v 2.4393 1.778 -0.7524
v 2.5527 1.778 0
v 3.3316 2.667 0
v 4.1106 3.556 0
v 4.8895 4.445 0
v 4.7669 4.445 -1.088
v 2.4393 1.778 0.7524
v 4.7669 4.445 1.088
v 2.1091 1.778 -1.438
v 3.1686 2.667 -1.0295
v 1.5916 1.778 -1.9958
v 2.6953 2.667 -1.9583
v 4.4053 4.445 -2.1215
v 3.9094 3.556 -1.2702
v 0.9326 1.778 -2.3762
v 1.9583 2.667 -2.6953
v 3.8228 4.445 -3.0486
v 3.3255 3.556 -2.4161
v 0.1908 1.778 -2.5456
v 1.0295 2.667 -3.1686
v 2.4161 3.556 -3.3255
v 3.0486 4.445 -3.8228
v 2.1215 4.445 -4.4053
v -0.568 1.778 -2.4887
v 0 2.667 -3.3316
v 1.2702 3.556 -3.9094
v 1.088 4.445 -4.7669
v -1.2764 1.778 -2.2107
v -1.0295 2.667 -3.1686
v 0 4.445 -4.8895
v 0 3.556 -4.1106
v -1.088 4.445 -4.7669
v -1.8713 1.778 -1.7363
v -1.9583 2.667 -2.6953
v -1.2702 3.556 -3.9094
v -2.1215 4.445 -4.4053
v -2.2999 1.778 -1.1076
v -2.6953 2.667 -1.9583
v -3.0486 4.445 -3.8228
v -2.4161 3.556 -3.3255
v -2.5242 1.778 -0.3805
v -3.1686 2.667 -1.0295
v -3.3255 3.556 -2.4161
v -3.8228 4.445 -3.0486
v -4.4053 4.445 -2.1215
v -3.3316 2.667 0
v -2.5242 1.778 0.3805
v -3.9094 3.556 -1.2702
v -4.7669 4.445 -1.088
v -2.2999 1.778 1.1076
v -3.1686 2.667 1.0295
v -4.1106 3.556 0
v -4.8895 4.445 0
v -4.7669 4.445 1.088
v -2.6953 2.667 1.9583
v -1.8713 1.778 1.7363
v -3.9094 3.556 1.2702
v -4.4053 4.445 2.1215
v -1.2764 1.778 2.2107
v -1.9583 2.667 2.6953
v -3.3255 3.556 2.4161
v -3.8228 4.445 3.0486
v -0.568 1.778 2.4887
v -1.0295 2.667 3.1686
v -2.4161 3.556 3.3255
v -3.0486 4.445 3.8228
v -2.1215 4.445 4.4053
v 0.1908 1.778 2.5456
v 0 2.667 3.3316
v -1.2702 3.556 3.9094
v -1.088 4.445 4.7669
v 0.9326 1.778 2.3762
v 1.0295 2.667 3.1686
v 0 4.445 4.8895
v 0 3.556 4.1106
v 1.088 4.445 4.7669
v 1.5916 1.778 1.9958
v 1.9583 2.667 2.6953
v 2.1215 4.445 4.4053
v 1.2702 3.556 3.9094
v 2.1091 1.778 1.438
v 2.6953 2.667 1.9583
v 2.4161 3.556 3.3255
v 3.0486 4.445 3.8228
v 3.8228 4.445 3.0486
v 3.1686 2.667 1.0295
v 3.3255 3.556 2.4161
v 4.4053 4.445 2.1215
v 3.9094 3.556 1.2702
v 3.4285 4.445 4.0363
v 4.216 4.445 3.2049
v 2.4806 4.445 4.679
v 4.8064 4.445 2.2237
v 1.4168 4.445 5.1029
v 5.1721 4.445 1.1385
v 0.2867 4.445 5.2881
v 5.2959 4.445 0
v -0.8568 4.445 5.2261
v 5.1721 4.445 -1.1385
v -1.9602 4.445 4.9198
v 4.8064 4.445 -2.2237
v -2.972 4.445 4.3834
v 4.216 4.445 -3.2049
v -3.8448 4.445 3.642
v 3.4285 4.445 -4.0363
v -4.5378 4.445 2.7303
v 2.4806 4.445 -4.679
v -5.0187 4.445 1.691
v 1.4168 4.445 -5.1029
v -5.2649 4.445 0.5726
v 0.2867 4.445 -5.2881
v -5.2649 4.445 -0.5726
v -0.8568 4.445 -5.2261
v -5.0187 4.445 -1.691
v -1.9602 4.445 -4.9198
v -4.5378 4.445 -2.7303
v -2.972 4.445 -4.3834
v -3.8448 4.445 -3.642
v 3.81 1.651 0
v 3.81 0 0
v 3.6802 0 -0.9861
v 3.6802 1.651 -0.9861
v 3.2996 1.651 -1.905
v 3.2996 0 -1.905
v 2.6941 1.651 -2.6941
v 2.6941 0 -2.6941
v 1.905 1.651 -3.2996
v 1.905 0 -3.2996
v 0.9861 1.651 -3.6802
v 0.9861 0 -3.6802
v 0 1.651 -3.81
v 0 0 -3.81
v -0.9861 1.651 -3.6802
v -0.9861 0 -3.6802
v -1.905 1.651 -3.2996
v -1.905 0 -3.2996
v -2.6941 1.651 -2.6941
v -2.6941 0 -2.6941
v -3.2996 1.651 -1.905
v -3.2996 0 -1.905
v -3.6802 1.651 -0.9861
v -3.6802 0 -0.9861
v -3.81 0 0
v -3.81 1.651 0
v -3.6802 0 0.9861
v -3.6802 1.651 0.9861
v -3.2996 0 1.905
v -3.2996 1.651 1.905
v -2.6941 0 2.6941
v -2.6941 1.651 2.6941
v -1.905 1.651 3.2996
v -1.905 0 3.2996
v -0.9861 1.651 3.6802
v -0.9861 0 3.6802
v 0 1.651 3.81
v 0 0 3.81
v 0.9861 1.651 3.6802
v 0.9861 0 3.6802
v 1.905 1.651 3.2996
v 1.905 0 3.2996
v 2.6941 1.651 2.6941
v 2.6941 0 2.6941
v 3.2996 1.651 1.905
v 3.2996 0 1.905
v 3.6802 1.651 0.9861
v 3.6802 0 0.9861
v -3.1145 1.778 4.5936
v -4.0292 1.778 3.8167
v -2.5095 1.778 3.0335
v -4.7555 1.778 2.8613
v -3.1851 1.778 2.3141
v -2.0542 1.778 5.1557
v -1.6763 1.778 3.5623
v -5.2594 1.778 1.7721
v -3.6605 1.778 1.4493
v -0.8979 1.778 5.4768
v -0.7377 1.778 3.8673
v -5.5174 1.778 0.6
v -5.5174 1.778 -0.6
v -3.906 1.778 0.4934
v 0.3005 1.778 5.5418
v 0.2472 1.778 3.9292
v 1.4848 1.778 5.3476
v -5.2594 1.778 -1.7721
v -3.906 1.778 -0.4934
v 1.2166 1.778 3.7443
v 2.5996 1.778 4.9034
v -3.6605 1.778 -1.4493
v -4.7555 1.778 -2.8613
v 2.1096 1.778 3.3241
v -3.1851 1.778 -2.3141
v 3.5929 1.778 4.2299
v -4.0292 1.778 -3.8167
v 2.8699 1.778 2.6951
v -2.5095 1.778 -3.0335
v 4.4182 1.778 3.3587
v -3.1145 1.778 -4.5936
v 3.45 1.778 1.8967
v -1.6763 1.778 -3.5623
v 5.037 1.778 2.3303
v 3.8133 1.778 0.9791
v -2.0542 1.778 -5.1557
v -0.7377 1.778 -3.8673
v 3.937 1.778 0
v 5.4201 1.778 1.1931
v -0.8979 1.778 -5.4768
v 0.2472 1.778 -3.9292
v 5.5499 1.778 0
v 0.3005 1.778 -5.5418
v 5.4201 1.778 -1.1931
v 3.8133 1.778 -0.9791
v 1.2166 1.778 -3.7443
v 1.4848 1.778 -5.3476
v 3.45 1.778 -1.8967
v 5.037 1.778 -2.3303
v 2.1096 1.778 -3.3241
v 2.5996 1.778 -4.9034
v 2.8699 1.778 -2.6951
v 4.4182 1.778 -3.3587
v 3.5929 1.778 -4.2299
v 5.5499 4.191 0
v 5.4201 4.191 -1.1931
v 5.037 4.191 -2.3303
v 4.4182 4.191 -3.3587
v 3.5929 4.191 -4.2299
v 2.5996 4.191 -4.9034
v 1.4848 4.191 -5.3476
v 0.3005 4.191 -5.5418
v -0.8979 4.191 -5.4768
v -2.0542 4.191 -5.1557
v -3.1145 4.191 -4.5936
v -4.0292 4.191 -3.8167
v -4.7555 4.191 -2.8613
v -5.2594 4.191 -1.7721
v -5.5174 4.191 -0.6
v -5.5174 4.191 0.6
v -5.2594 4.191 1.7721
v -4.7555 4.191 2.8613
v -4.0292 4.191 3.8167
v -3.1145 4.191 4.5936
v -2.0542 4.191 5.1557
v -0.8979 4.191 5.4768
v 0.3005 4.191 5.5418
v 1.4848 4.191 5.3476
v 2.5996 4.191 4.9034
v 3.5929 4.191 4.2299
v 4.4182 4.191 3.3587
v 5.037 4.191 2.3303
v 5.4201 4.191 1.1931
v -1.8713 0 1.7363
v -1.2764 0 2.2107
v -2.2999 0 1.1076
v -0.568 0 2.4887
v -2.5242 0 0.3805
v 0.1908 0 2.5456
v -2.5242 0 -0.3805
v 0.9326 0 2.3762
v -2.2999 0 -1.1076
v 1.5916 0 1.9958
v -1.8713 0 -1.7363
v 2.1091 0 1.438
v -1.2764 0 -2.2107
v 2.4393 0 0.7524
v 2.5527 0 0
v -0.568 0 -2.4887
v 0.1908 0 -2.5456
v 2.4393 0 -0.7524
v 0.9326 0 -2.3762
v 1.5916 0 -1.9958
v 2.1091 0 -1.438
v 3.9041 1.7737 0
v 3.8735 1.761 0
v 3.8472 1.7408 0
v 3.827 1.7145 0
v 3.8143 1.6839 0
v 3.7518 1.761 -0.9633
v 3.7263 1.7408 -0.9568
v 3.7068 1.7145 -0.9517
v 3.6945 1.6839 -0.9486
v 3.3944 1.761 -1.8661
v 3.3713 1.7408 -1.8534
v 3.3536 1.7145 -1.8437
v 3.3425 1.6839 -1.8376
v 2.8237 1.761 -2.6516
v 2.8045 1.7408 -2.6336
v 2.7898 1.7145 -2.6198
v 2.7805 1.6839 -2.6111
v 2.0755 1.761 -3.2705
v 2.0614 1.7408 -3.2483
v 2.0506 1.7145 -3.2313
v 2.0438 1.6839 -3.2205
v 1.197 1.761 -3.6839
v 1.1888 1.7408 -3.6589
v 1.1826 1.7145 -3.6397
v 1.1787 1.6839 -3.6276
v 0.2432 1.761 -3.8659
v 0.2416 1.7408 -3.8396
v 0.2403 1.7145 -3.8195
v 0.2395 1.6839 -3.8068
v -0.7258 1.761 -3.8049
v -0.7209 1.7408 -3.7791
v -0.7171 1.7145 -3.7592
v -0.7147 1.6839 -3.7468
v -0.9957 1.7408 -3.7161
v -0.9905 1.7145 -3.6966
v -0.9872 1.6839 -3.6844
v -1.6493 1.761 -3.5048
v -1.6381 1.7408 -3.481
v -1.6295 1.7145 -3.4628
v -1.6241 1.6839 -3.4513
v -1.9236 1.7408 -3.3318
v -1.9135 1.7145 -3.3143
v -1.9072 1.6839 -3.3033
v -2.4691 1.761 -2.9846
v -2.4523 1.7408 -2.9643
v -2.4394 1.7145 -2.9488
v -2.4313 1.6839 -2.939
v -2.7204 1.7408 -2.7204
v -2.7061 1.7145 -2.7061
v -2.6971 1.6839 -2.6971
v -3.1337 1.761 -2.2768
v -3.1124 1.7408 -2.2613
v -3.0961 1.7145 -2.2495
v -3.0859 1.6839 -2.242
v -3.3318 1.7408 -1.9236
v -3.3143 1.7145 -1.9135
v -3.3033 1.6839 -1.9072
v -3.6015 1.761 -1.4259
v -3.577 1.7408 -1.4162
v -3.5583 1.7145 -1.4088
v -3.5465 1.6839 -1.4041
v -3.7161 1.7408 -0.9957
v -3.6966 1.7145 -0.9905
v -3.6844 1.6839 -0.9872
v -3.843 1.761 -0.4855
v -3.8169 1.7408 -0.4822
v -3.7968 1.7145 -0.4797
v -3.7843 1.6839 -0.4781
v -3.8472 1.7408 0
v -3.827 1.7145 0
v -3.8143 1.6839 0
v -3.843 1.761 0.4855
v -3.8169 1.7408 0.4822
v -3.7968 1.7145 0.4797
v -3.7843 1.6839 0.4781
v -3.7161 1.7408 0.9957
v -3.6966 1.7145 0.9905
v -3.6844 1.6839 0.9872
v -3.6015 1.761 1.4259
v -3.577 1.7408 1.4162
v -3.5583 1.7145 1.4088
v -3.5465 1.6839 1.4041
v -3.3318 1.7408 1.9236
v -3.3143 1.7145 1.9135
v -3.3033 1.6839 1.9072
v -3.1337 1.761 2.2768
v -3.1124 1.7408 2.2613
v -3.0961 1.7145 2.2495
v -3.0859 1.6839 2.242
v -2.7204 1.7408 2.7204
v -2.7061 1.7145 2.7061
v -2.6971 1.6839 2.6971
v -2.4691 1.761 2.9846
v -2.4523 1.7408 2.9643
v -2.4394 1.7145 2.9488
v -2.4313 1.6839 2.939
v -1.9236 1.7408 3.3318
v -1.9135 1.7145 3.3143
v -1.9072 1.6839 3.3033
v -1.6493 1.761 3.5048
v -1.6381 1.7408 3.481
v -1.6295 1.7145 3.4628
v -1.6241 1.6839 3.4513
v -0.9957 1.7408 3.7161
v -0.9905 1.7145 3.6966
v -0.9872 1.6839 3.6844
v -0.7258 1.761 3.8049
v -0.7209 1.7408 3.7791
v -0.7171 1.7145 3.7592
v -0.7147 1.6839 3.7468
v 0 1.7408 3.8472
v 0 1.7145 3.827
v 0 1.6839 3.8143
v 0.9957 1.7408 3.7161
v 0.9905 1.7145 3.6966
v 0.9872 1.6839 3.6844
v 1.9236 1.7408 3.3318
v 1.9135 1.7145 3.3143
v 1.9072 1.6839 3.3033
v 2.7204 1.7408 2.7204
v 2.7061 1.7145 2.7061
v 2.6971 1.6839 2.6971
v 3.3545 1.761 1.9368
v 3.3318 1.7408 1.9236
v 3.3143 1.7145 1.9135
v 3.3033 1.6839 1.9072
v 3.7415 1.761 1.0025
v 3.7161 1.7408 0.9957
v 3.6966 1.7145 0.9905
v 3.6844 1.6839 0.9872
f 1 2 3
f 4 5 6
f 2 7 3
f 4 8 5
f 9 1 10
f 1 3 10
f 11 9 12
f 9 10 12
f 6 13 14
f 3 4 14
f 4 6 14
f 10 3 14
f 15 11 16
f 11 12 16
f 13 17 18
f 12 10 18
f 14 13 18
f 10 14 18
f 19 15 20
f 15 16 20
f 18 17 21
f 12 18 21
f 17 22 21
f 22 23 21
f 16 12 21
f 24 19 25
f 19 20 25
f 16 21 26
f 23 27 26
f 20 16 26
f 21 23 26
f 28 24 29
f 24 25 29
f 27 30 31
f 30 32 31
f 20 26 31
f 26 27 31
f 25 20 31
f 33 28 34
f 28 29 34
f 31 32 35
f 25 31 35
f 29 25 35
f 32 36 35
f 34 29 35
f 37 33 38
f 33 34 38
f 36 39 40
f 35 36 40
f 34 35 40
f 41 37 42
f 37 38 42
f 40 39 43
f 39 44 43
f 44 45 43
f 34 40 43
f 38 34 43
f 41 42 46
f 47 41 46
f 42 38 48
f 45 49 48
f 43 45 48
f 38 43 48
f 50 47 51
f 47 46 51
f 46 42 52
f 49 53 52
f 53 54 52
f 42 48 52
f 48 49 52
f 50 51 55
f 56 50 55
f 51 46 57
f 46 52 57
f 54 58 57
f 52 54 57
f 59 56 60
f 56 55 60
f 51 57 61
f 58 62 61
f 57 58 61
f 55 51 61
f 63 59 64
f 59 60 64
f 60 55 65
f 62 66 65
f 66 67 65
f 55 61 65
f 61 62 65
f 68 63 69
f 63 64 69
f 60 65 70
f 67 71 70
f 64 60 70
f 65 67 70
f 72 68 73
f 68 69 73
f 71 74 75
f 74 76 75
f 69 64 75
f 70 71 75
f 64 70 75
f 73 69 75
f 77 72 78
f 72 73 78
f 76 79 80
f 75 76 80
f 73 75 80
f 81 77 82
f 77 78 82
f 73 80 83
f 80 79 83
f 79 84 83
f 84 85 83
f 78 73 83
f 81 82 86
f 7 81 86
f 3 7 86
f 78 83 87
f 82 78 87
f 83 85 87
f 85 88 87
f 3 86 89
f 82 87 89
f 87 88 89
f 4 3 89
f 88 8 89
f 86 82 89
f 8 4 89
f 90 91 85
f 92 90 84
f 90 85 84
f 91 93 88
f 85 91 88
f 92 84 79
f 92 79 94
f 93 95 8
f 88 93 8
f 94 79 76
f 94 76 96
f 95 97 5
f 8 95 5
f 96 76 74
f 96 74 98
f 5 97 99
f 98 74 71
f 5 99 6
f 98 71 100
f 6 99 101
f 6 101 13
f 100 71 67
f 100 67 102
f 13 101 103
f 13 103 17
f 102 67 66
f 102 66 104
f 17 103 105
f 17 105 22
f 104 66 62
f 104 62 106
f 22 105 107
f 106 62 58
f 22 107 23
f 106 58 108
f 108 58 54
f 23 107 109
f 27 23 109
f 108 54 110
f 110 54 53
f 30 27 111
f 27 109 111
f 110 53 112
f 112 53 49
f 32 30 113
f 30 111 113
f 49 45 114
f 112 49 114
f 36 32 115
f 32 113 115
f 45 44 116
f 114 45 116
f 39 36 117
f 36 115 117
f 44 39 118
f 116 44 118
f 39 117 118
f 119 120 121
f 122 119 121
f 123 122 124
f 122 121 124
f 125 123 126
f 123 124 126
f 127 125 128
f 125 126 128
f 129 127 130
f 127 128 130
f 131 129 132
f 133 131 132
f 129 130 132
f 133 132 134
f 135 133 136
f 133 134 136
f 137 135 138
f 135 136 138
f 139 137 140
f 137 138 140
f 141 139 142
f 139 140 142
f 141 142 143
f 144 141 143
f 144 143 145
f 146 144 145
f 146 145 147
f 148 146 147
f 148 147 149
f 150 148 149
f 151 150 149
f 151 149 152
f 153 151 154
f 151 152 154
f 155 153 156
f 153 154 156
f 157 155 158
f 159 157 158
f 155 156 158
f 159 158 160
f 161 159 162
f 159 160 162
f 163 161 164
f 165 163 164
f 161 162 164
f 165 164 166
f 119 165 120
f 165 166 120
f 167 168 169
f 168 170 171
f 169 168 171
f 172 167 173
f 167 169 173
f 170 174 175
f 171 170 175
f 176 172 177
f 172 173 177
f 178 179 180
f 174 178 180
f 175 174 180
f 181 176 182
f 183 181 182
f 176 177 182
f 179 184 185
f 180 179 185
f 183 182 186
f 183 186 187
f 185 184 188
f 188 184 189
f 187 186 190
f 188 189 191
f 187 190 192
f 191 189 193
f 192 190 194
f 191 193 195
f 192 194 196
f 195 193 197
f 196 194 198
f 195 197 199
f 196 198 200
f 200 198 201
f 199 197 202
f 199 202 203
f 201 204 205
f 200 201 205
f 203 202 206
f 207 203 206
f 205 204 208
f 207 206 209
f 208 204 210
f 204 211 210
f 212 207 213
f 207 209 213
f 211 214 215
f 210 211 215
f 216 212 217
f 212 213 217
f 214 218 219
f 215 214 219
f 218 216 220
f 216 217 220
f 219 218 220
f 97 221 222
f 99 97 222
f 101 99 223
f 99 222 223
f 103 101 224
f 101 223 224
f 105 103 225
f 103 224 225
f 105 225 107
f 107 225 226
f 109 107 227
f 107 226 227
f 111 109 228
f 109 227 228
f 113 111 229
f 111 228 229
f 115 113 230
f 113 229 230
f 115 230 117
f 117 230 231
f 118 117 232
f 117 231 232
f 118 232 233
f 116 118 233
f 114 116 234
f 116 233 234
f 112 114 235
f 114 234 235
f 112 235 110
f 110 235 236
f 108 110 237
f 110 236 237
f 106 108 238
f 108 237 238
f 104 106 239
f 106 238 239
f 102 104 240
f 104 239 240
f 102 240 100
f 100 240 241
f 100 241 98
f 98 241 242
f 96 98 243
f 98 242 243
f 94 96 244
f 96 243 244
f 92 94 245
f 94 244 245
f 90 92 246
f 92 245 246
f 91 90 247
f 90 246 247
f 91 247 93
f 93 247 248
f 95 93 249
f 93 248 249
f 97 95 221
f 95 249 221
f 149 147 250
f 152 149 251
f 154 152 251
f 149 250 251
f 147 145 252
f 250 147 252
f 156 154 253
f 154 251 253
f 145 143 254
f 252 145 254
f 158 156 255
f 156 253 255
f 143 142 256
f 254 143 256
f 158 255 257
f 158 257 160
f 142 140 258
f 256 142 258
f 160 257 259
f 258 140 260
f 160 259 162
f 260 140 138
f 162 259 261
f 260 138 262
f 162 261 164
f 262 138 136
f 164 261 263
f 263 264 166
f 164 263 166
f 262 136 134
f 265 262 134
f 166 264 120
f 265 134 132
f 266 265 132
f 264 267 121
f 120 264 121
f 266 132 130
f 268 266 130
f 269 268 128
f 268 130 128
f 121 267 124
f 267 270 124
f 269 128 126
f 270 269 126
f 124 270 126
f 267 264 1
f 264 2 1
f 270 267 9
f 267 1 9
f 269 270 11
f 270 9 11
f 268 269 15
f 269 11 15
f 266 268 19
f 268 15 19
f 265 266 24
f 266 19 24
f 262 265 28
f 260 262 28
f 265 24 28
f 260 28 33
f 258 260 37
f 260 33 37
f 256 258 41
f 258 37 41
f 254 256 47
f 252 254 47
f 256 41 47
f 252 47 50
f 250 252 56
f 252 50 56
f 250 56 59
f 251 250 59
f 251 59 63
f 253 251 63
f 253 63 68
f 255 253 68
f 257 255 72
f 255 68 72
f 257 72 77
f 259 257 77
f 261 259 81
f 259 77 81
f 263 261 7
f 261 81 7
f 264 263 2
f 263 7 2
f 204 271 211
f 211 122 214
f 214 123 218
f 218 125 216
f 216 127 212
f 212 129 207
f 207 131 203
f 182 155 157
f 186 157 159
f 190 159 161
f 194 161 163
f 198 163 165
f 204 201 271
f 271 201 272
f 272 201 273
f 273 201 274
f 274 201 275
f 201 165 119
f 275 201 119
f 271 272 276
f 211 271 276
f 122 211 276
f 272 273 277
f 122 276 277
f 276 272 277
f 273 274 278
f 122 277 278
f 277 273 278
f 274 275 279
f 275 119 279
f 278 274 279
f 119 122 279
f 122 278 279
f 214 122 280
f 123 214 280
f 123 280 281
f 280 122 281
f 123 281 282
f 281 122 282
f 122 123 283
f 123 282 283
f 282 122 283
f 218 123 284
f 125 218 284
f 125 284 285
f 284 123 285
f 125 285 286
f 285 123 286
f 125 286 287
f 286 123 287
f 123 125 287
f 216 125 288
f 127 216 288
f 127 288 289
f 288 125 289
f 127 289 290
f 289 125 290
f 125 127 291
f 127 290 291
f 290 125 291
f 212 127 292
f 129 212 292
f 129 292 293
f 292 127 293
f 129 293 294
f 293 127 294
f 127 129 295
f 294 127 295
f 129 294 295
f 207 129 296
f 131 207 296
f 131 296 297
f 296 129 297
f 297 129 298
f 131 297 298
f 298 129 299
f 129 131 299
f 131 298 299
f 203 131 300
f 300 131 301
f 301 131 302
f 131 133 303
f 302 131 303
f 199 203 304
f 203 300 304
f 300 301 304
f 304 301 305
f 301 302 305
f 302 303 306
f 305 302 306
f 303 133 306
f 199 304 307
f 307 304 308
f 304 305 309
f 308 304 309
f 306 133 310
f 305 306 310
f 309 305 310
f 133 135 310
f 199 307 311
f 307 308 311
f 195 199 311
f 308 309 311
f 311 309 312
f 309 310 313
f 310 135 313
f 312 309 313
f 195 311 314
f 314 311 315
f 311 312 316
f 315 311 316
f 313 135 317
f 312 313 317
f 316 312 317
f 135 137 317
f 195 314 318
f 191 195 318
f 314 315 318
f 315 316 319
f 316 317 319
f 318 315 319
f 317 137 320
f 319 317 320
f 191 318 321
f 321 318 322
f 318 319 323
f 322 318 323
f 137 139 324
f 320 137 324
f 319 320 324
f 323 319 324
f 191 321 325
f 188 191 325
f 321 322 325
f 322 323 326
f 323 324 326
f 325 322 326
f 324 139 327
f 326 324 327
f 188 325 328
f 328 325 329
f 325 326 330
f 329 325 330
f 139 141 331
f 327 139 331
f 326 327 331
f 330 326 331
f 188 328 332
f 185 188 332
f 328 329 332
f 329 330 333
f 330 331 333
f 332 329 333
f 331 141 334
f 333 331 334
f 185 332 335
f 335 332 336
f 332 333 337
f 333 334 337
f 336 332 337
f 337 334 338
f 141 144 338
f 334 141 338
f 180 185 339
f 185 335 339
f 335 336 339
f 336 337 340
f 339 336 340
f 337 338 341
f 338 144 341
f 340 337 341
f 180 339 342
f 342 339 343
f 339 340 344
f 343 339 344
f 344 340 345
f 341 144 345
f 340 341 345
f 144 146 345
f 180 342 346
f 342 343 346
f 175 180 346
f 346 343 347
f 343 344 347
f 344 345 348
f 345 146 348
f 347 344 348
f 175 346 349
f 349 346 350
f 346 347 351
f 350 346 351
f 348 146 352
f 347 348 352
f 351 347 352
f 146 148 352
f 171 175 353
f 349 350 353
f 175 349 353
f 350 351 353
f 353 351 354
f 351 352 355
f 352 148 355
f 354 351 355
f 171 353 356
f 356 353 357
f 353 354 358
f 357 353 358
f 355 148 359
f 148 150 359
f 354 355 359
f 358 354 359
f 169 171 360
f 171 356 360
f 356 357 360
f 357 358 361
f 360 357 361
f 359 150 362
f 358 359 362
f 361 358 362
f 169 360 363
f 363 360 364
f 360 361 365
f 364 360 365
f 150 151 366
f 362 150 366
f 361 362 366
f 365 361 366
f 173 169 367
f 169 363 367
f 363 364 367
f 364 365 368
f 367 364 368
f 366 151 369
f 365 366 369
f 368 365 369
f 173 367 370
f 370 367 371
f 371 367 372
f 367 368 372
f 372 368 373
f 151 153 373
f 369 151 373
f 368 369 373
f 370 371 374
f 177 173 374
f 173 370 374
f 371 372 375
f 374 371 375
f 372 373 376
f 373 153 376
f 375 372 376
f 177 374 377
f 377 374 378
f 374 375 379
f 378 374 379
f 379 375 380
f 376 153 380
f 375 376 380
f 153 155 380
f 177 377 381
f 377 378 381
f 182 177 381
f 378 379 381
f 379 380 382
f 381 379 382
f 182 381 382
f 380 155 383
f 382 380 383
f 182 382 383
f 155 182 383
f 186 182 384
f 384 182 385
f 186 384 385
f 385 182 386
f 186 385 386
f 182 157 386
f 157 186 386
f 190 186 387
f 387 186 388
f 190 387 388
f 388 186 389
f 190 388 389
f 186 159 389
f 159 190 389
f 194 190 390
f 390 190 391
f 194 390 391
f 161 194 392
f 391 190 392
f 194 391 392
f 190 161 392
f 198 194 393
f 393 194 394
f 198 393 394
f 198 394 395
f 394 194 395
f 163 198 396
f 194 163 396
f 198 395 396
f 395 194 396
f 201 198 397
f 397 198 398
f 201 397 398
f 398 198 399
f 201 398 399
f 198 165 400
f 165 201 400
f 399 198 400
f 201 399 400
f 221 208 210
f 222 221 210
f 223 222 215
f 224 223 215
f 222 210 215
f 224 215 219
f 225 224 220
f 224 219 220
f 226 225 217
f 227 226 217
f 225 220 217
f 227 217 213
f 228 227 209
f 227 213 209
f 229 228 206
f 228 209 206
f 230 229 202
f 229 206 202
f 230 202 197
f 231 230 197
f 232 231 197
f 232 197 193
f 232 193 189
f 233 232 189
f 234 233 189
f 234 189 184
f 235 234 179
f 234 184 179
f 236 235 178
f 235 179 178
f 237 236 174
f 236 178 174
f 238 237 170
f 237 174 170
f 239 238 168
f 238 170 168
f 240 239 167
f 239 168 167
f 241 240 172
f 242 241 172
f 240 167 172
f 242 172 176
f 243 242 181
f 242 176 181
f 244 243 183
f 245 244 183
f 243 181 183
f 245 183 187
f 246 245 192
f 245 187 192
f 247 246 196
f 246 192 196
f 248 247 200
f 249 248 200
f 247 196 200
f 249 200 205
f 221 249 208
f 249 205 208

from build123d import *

# Parameters (mm, degrees)
CHAMFER1_SIZE = 0.254
FILLET1_R     = 0.127


with BuildPart() as part:
    # Sketch1 → Revolve1 (revolve)
    with BuildSketch(Plane.XY):
        Polygon((2.5527, 0), (2.5527, 1.778), (4.8895, 4.445), (5.5499, 4.445), (5.5499, 1.778), (3.81, 1.778), (3.81, 0), align=None)
    revolve(axis=Axis((0, 0, 0), (0, 1, 0)))

    # Chamfer1
    chamfer1_edges = [part.edges().sort_by_distance(p)[0] for p in [
        (-5.5499, 4.445, 0),
    ]]
    chamfer(chamfer1_edges, length=CHAMFER1_SIZE)

    # Fillet1
    fillet1_edges = [part.edges().sort_by_distance(p)[0] for p in [
        (-3.81, 1.778, 0),
    ]]
    fillet(fillet1_edges, radius=FILLET1_R)


solid = part.part
